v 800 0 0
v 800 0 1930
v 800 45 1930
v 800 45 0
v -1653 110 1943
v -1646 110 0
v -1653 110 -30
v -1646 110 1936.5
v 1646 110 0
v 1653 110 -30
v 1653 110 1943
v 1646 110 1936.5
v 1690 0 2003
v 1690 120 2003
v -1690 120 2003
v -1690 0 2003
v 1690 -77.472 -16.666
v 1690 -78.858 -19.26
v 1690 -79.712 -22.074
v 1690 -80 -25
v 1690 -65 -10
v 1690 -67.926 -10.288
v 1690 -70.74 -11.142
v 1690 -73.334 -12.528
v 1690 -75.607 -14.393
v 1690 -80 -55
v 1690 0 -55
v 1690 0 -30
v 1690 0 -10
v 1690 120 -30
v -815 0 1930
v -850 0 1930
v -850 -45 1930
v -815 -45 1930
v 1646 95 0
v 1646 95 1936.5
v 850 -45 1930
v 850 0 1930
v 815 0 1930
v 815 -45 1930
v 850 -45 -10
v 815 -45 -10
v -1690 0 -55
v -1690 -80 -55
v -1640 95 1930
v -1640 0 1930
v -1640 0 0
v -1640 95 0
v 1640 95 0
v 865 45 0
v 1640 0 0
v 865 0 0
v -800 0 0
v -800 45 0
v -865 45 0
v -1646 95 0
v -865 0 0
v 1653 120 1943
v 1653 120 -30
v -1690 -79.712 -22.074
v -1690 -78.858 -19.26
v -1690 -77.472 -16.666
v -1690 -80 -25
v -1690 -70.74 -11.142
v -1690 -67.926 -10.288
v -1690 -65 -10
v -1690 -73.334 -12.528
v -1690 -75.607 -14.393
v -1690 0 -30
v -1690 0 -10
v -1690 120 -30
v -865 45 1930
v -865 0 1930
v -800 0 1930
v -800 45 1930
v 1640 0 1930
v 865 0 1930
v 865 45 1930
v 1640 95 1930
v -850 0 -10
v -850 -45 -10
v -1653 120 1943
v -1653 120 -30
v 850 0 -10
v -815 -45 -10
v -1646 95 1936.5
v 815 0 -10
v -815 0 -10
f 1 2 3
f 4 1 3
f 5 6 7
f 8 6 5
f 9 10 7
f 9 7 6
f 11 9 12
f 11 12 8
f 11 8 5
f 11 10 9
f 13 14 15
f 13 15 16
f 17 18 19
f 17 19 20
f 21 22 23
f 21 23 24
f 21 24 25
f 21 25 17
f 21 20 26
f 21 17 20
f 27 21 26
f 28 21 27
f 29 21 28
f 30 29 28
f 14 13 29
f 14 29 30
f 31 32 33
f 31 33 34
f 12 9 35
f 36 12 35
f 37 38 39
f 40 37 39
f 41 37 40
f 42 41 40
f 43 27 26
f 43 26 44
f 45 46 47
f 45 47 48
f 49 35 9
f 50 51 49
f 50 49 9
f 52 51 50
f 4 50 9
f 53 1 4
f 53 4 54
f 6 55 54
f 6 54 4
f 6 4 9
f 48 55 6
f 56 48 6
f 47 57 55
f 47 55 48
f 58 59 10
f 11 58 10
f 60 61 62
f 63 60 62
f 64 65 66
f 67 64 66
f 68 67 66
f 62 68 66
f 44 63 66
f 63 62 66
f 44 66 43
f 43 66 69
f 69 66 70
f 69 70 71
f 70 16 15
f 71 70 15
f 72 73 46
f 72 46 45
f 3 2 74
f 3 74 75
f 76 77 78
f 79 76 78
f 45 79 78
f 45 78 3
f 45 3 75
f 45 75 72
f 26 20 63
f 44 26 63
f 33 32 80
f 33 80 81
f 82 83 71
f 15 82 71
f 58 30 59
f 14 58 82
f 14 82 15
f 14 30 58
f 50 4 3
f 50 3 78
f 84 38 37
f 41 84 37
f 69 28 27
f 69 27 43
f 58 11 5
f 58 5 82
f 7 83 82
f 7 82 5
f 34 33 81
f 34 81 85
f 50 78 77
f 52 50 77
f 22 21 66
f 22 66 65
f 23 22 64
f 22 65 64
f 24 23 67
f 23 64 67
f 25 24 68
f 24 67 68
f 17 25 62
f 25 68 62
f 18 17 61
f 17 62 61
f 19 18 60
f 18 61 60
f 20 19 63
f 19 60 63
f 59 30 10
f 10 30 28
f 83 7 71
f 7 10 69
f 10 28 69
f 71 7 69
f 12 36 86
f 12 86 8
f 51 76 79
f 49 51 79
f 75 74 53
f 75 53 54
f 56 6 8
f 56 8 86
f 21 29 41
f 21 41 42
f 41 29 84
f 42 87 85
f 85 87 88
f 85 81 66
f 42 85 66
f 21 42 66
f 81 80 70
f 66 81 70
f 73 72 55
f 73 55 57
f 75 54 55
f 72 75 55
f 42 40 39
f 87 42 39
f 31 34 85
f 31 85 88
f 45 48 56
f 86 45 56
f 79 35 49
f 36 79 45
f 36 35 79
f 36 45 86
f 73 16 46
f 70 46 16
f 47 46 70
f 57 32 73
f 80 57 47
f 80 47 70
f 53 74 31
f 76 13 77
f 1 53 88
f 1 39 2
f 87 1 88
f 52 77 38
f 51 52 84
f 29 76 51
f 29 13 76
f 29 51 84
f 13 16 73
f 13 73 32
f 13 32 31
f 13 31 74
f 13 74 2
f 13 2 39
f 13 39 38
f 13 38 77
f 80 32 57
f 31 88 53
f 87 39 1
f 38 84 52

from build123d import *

# Parameters (mm, degrees)
F0_W      = 50
F0_H      = 95
F1_DEPTH  = 1930
F2_W      = 1690
F2_H      = 110
F3_DEPTH  = 30
F4_W      = 1690
F4_H      = 45
F5_DEPTH  = 80
F6_DEPTH  = 25
F7_R      = 15
F9_DEPTH  = 2033
F11_DEPTH = 50
F12_DEPTH = 1640


with BuildPart() as f1:
    # F0 (on Top) → F1 (new body)
    with BuildSketch(Plane.XY):
        Polygon((-815, 0), (-800, 0), (-800, 45), (-865, 45), (-865, 0), (-850, 0), (-850, -45), (-815, -45), align=None)
        with Locations((-1665, 47.5)):
            Rectangle(F0_W, F0_H)
    extrude(amount=F1_DEPTH)

    # F2 (on face) → F3 (join)
    with BuildSketch(Plane(origin=(0, 0, 0), x_dir=(1, 0, 0), z_dir=(0, 0, -1))):
        with Locations((-845, -55)):
            Rectangle(F2_W, F2_H)
    extrude(amount=F3_DEPTH)

    # F4 (on face) → F5 (join)
    with BuildSketch(Plane.XZ):
        with Locations((-845, -32.5)):
            Rectangle(F4_W, F4_H)
    extrude(amount=F5_DEPTH)

    # F0 (on Top) → F6 (join)
    with BuildSketch(Plane.XY):
        Polygon((-815, 0), (-800, 0), (-800, 45), (-865, 45), (-865, 0), (-850, 0), (-850, -45), (-815, -45), align=None)
        with Locations((-1665, 47.5)):
            Rectangle(F0_W, F0_H)
    extrude(amount=-F6_DEPTH)

    # F7
    f7_edges = [f1.edges().sort_by_distance(p)[0] for p in [
        (-845, -80, -10),
    ]]
    fillet(f7_edges, radius=F7_R)

    # F8 (on face) → F9 (join)
    with BuildSketch(Plane(origin=(0, 0, -30), x_dir=(1, 0, 0), z_dir=(0, 0, -1))):
        Polygon((-1690, -90), (-1690, -110), (-1690, -120), (-1653, -120), (-1653, -110), (-1646, -110), (-1646, -90), align=None)
    extrude(amount=-F9_DEPTH)

    # F10 (on face) → F11 (join, through all)
    with BuildSketch(Plane.YZ.offset(-1640)):
        Polygon((0, 2003), (0, 1930), (95, 1930), (95, 1936.5), (110, 1936.5), (110, 1943), (120, 1943), (120, 2003), align=None)
    extrude(amount=-F11_DEPTH)

    # F10 (on face) → F12 (join, through all)
    with BuildSketch(Plane.YZ.offset(-1640)):
        Polygon((0, 2003), (0, 1930), (95, 1930), (95, 1936.5), (110, 1936.5), (110, 1943), (120, 1943), (120, 2003), align=None)
    extrude(amount=F12_DEPTH)

    # F13: F1 across plane


with BuildPart() as f1_1:
    add(f1.part)
    add(f1.part.mirror(Plane.YZ))


solid = f1_1.part
